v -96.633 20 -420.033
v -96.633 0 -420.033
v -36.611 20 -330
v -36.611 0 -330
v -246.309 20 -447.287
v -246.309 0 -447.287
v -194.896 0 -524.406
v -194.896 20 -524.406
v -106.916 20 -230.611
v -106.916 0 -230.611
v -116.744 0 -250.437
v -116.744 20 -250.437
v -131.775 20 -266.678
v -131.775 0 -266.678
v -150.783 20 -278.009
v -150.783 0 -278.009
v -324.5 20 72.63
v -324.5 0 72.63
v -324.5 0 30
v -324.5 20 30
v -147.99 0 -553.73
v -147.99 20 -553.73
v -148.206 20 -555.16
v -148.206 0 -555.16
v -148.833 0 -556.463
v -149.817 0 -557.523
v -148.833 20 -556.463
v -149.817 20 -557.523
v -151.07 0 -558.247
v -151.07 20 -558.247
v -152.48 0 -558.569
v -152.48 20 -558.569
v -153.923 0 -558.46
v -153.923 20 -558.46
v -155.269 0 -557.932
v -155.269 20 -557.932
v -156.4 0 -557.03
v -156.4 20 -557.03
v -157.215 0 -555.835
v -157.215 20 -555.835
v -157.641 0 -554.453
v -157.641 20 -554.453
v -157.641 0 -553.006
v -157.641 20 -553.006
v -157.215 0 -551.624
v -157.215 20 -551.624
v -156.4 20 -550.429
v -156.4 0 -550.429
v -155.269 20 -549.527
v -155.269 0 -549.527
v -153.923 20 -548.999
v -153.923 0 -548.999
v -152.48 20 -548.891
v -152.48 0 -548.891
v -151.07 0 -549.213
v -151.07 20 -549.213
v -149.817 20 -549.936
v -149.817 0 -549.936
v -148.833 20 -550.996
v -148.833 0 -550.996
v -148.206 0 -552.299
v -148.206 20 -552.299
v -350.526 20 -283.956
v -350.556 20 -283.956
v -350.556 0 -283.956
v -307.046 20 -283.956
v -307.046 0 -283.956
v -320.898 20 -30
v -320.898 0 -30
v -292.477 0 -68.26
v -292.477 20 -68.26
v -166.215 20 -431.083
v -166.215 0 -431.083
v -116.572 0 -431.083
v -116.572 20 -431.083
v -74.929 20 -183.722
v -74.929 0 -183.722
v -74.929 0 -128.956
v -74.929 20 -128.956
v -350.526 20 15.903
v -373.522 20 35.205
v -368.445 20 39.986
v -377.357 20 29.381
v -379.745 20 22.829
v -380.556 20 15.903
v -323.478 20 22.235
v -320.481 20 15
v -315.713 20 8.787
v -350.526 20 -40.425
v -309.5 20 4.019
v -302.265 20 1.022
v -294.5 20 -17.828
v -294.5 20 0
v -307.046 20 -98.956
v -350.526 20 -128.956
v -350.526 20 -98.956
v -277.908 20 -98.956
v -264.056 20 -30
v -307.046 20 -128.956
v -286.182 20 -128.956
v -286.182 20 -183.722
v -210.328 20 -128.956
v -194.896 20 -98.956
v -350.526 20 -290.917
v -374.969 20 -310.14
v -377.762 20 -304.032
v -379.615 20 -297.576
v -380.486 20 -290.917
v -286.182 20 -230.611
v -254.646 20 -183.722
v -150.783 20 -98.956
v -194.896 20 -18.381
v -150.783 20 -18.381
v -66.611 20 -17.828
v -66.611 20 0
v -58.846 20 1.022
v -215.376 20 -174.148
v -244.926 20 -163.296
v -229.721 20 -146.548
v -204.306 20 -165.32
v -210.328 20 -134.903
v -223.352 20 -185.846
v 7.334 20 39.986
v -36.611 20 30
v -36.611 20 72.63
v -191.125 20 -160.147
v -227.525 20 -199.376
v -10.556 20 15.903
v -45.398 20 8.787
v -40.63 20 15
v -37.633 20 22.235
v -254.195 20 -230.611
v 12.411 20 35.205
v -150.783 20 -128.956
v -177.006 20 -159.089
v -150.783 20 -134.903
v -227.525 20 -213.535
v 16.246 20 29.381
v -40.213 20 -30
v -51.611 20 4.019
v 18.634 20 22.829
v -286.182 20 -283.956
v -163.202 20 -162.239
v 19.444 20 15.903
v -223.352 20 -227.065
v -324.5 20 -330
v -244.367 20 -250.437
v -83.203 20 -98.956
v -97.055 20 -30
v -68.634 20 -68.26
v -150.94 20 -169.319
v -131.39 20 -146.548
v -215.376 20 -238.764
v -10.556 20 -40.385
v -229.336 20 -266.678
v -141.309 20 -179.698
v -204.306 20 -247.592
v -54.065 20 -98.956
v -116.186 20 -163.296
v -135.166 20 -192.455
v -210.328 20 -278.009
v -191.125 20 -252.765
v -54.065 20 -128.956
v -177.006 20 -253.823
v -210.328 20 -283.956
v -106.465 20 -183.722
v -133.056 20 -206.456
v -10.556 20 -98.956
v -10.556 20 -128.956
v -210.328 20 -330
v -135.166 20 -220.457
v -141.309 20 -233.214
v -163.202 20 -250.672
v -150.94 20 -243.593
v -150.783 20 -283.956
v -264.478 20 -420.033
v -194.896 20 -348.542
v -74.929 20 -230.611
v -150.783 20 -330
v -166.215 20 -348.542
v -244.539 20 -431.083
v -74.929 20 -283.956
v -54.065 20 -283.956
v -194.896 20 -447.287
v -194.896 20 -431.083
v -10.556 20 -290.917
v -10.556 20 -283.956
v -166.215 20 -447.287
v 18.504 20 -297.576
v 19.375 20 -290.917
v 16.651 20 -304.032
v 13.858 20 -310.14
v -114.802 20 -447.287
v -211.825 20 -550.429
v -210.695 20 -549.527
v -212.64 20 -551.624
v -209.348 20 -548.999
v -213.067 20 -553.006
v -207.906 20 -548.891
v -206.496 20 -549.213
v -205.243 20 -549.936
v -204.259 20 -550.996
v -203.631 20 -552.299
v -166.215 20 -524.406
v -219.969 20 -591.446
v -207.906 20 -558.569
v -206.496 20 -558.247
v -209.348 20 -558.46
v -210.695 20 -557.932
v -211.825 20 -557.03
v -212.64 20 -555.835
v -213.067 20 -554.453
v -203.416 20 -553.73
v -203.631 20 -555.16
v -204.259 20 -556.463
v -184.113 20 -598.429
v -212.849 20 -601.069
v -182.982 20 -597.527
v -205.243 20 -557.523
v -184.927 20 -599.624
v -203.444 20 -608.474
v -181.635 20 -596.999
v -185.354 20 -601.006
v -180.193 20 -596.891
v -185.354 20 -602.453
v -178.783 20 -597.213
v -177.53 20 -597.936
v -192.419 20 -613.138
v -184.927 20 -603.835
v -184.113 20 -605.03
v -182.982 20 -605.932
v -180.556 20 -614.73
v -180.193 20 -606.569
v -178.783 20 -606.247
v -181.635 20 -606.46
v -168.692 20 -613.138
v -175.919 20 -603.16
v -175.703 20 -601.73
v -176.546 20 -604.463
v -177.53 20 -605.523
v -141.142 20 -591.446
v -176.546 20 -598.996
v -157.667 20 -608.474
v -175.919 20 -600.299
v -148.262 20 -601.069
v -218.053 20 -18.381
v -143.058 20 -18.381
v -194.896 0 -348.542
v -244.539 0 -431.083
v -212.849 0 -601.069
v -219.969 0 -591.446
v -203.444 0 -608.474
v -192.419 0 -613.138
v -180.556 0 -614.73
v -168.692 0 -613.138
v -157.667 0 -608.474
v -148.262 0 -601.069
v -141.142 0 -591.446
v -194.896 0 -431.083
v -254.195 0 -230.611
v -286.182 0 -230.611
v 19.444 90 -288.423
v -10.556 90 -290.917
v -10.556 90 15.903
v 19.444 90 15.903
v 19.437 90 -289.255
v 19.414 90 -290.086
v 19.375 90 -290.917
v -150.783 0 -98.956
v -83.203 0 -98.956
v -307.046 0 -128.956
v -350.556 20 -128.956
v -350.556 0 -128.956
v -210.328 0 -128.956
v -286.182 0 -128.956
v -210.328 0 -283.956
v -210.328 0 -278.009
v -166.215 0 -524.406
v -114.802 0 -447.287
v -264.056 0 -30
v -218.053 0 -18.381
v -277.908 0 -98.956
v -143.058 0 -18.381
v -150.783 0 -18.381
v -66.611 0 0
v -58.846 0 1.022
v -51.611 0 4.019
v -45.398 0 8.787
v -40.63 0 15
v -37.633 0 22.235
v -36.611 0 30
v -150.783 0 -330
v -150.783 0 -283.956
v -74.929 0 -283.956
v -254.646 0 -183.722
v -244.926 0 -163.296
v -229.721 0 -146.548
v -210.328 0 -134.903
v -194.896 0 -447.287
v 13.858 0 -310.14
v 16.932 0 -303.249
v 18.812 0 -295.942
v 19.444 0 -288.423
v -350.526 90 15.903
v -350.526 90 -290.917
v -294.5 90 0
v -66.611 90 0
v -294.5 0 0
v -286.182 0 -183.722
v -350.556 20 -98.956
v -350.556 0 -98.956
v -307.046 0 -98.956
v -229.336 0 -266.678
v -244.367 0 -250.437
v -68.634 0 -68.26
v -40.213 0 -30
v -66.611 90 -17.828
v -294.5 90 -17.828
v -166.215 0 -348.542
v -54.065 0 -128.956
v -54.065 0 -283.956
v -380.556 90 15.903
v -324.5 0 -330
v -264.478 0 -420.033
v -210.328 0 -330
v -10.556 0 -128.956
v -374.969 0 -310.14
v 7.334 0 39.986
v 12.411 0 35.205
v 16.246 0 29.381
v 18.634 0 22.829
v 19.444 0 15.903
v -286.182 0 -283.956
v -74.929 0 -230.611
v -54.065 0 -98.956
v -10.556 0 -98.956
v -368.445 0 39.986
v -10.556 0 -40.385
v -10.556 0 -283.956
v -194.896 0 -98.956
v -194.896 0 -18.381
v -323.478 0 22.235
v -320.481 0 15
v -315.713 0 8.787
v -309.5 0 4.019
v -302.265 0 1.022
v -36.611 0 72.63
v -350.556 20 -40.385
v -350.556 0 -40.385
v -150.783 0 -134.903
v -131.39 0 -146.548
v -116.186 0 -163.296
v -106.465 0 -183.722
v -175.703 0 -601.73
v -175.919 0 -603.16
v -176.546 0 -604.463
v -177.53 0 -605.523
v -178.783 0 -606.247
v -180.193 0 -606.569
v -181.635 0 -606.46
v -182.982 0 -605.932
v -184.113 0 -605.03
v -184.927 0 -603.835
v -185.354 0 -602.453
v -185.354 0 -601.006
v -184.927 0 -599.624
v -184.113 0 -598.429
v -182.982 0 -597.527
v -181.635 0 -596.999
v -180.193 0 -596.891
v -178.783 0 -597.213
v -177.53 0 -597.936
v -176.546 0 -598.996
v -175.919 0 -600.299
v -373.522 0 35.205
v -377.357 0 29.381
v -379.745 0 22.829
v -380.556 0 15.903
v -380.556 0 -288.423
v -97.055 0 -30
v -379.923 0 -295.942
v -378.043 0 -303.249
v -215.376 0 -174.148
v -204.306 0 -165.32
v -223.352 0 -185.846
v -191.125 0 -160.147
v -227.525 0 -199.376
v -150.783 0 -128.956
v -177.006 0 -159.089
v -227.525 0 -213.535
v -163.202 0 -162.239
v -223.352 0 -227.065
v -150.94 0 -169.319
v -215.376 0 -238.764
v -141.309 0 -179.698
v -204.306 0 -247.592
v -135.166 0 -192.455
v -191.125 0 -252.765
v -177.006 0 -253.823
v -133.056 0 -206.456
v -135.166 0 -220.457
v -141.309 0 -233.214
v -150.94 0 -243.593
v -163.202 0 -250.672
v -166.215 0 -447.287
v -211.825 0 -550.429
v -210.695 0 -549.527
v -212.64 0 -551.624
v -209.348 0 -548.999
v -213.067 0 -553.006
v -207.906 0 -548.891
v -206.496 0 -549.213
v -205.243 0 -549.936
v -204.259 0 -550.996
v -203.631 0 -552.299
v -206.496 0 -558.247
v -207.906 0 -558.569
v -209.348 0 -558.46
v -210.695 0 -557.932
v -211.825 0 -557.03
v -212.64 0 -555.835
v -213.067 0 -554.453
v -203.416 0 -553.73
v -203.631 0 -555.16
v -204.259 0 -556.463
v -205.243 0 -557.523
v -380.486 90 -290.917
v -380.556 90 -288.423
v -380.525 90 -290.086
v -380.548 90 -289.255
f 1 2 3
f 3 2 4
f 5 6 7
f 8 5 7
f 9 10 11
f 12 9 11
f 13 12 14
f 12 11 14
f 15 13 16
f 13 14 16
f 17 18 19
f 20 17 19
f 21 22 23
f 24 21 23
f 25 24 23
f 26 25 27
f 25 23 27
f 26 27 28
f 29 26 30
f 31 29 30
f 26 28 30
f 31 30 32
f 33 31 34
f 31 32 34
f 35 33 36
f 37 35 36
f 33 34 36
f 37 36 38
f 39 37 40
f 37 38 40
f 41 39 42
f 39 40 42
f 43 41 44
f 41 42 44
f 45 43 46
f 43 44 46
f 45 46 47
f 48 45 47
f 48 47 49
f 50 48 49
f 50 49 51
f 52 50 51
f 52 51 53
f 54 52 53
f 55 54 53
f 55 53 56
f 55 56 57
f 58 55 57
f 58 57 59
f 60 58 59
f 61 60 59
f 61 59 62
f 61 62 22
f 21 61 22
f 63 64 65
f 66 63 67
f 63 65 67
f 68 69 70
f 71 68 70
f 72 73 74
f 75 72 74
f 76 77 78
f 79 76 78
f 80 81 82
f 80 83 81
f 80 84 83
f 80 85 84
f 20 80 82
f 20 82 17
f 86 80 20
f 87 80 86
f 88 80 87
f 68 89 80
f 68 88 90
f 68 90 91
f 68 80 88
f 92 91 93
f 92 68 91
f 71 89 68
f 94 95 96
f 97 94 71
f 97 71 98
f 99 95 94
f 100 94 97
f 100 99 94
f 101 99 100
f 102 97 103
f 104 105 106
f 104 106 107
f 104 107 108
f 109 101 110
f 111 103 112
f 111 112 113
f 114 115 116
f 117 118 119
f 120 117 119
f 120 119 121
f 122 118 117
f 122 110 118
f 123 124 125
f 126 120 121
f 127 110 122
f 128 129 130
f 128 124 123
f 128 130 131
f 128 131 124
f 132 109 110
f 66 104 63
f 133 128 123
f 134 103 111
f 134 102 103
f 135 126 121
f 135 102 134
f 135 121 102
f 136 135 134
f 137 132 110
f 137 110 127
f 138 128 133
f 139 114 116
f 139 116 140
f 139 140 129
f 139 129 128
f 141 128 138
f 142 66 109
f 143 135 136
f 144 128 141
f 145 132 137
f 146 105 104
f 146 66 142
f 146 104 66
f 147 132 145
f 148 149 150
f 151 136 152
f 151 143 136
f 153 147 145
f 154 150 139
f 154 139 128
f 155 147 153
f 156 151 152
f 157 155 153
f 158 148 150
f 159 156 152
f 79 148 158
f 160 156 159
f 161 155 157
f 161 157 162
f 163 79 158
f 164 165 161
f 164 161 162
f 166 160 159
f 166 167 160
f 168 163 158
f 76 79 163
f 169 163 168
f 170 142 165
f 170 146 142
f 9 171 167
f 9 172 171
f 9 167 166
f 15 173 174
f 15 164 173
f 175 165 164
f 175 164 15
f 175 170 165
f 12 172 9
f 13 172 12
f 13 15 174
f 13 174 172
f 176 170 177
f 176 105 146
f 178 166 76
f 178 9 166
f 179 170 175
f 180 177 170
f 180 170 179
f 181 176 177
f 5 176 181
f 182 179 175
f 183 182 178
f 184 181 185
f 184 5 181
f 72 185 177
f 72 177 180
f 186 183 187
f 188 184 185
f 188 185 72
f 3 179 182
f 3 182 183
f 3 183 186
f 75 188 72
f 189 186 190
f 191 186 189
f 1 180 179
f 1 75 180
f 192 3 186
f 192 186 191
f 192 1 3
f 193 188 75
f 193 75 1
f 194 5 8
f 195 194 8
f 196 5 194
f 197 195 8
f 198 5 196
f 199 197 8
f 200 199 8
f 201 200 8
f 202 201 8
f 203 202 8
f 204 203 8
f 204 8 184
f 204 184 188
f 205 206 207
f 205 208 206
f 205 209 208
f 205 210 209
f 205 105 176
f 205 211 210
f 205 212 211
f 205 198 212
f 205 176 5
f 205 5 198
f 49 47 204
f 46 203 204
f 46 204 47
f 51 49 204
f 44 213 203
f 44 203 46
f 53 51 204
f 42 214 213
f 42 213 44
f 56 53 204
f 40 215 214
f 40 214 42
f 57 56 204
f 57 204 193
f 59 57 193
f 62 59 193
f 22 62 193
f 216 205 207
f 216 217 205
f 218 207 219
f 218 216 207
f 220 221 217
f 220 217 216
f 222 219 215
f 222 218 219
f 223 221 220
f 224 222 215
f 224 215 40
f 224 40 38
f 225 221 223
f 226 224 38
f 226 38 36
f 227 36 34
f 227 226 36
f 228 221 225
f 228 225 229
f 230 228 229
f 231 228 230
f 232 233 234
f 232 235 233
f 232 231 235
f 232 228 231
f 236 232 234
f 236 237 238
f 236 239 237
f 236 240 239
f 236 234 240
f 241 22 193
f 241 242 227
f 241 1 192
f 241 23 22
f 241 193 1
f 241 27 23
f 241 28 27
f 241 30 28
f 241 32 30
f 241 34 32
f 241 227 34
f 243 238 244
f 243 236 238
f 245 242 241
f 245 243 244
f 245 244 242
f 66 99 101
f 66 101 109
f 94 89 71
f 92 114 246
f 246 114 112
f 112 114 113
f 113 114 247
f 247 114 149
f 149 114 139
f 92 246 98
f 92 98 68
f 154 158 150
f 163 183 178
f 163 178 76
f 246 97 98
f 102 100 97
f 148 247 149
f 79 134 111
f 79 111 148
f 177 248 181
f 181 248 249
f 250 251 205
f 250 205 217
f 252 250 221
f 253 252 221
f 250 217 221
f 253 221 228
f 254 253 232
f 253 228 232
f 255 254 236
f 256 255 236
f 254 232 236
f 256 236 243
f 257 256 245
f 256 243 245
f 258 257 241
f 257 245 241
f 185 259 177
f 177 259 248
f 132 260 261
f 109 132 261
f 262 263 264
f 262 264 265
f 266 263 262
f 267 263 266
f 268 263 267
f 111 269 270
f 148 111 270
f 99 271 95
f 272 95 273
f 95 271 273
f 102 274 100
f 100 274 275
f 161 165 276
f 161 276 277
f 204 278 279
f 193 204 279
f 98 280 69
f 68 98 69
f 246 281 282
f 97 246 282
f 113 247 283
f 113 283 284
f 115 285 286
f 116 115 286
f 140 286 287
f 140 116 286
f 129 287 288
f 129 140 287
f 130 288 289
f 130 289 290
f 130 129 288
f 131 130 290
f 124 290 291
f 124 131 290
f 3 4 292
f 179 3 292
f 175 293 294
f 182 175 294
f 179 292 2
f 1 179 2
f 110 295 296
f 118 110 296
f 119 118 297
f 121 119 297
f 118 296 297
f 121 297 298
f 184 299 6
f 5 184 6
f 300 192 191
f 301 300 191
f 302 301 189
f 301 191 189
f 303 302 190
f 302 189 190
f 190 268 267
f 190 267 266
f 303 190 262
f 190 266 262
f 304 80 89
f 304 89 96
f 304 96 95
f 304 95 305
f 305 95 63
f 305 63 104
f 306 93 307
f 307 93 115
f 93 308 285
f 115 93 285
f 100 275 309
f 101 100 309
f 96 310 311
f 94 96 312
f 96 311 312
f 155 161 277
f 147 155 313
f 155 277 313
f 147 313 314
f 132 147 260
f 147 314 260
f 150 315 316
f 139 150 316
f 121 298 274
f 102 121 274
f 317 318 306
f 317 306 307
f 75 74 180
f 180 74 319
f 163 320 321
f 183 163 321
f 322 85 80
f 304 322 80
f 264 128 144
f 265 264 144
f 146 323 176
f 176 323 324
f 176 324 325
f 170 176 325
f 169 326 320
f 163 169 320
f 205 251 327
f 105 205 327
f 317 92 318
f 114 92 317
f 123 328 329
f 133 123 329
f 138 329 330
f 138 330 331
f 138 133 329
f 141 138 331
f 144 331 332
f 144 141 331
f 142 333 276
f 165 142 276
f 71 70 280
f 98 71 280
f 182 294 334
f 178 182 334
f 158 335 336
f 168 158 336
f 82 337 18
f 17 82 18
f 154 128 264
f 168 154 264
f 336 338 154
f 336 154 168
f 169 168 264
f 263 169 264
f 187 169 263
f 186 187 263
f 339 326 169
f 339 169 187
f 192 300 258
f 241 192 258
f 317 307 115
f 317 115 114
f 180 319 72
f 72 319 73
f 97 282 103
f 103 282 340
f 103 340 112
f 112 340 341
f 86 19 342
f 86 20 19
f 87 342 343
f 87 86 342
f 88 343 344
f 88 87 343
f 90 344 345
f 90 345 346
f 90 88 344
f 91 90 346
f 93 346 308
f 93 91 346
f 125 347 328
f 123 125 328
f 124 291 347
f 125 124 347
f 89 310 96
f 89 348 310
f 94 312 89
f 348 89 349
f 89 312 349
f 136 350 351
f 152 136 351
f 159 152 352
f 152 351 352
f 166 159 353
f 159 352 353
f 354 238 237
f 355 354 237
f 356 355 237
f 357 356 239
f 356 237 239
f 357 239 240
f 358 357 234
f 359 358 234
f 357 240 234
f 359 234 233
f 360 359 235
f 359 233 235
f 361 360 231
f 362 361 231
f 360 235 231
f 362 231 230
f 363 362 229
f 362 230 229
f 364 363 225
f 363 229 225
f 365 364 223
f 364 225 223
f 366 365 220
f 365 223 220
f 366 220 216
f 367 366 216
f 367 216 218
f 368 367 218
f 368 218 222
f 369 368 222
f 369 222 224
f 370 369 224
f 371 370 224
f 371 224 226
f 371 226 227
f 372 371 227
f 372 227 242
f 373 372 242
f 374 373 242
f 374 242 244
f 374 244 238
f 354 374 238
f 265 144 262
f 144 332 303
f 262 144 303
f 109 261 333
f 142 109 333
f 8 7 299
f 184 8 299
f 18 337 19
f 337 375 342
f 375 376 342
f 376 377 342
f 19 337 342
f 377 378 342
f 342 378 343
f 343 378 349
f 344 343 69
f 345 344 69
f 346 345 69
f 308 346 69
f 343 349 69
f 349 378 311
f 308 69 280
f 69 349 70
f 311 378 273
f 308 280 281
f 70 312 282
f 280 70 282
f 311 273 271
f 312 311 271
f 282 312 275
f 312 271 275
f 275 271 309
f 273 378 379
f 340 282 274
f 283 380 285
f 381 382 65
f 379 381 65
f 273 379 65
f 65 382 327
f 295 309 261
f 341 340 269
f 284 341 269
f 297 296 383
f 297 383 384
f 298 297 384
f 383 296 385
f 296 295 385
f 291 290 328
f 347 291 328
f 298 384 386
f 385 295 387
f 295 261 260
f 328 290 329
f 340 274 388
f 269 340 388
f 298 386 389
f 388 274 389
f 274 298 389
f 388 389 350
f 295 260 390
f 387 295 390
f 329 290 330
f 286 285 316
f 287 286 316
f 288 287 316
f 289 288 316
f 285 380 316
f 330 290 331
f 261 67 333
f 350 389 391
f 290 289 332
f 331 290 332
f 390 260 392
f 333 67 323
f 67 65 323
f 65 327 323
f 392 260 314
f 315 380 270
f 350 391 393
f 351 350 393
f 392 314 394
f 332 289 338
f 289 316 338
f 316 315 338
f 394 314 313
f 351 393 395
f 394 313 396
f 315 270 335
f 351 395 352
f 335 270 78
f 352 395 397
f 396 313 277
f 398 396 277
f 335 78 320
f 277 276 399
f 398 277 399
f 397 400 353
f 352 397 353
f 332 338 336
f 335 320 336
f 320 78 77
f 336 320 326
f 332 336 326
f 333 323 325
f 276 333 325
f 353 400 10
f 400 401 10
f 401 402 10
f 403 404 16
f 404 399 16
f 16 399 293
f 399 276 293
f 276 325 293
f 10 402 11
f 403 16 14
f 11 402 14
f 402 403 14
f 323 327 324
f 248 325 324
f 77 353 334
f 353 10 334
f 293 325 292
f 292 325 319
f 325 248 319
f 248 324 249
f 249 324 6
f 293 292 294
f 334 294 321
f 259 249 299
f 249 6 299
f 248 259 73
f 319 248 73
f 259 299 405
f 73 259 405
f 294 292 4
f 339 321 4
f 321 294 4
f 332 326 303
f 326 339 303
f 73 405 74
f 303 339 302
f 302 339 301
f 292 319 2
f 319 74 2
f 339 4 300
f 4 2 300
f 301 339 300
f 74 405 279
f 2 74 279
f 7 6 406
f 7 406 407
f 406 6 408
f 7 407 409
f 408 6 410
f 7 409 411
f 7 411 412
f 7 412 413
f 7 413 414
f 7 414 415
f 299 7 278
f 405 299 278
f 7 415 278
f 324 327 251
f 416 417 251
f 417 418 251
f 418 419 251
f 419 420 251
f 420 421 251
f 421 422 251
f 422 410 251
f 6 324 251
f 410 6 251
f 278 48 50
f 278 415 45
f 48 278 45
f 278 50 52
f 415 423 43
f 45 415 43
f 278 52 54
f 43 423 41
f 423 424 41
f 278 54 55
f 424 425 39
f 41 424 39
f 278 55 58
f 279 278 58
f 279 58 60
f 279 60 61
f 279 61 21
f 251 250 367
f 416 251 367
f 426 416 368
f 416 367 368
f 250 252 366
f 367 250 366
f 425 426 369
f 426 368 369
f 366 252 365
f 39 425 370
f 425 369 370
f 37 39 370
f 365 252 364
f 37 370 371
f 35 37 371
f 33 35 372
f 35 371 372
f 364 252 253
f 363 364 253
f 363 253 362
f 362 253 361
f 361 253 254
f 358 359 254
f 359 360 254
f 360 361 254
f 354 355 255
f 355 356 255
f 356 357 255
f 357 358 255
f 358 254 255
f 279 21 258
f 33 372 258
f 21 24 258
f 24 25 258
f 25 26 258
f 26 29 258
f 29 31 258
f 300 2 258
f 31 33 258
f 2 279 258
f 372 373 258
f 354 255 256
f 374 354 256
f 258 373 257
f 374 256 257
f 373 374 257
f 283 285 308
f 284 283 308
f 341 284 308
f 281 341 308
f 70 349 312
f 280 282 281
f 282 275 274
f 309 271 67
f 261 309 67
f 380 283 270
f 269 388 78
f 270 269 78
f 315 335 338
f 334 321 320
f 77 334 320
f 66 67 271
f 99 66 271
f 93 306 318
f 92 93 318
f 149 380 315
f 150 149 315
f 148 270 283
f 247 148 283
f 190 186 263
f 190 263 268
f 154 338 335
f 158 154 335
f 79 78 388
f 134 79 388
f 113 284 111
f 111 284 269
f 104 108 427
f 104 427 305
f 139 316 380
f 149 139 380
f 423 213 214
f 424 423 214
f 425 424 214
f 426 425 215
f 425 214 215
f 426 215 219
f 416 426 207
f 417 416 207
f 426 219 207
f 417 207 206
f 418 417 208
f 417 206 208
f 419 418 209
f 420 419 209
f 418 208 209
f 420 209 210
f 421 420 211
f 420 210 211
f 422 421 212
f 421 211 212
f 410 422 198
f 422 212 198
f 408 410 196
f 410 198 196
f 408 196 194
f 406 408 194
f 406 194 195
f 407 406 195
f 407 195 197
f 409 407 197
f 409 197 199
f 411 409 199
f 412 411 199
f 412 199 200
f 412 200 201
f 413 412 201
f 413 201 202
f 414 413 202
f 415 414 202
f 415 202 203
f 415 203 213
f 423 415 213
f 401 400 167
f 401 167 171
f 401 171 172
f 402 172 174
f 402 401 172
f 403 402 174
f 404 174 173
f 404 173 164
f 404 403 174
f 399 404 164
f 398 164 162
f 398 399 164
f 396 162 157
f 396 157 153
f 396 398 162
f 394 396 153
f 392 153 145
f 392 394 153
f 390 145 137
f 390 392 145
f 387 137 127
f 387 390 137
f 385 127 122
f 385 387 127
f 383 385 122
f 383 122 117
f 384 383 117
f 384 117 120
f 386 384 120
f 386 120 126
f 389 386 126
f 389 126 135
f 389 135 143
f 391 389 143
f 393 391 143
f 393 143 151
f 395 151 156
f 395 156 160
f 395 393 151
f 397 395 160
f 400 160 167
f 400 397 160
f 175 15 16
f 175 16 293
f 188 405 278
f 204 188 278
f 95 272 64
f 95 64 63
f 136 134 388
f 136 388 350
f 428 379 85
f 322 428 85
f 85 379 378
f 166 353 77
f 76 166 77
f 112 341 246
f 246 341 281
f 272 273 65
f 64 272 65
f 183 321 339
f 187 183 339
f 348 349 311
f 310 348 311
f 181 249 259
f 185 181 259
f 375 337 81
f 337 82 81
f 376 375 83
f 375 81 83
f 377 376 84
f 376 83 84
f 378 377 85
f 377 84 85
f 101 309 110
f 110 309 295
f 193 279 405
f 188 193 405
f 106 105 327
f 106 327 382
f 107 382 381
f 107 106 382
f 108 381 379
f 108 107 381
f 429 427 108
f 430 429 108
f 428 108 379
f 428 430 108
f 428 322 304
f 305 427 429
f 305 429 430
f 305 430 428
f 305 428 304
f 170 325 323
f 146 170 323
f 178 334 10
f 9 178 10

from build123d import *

# Parameters (mm, degrees)
SKETCH1_R            = 47.5
BOSS_EXTRUDE6_DEPTH  = 20
FILLET2_R            = 30
SKETCH3_W            = 227.888974491
SKETCH3_H            = 17.82820952
SKETCH3_W_2          = 30.029703607
SKETCH3_H_2          = 306.819916415
SKETCH3_W_3          = 30
BOSS_EXTRUDE12_DEPTH = 70
FILLET3_R            = 45
FILLET4_R            = 45
SKETCH4_R            = 4.852465173
CUT_EXTRUDE2_DEPTH   = 21


with BuildPart() as part:
    # Sketch1 → Boss-Extrude6 (new body)
    with BuildSketch(Plane(origin=(0, 0, 0), x_dir=(1, 0, 0), z_dir=(0, 1, 0))):
        Polygon((-324.500042801, -72.630227613), (-324.500042801, 0), (-36.61106831, 0), (-36.61106831, -72.630227613), (19.444444444, -30.98937664), (19.444444444, 0), (19.444444444, 300), (-180.555555556, 662.976241067), (-380.555555556, 300), (-380.555555556, 0), (-380.555555556, -30.98937664), align=None)
        Polygon((-264.055692307, 30), (-320.898350202, 30), (-292.477021255, 68.259836918), align=None, mode=Mode.SUBTRACT)
        Polygon((-350.555555556, 40.384990781), (-350.555555556, 98.955926659), (-307.046121917, 98.955926659), align=None, mode=Mode.SUBTRACT)
        Polygon((-194.895952536, 18.381237109), (-218.052993309, 18.381237109), (-277.907920592, 98.955926659), (-194.895952536, 98.955926659), align=None, mode=Mode.SUBTRACT)
        Polygon((-307.046121917, 128.955926659), (-350.555555556, 128.955926659), (-350.555555556, 178.791030317), (-350.555555556, 221.457829656), (-350.555555556, 283.955926659), (-307.046121917, 283.955926659), (-307.046121917, 221.457829656), (-307.046121917, 178.791030317), align=None, mode=Mode.SUBTRACT)
        with BuildLine():
            Line((-210.32776095, 128.955926659), (-286.18247229, 128.955926659))
            Line((-286.18247229, 128.955926659), (-286.18247229, 183.722078004))
            Line((-286.18247229, 183.722078004), (-254.646190087, 183.722078004))
            ThreePointArc((-254.646190087, 183.722078004), (-237.937656941, 154.364234033), (-210.32776095, 134.902689235))
            Line((-210.32776095, 134.902689235), (-210.32776095, 128.955926659))
        make_face(mode=Mode.SUBTRACT)
        with BuildLine():
            Line((-286.18247229, 230.610640855), (-286.18247229, 283.955926659))
            Line((-286.18247229, 283.955926659), (-210.32776095, 283.955926659))
            Line((-210.32776095, 283.955926659), (-210.32776095, 278.009164084))
            ThreePointArc((-210.32776095, 278.009164084), (-237.43400989, 259.09708387), (-254.195217302, 230.610640855))
            Line((-254.195217302, 230.610640855), (-286.18247229, 230.610640855))
        make_face(mode=Mode.SUBTRACT)
        with Locations((-180.555555556, 206.455926659)):
            Circle(SKETCH1_R, mode=Mode.SUBTRACT)
        Polygon((-143.058117802, 18.381237109), (-150.783350161, 18.381237109), (-150.783350161, 98.955926659), (-83.203190519, 98.955926659), align=None, mode=Mode.SUBTRACT)
        Polygon((-68.634089856, 68.259836918), (-40.212760909, 30), (-97.055418804, 30), align=None, mode=Mode.SUBTRACT)
        Polygon((-10.555555556, 98.955926659), (-10.555555556, 40.384990781), (-54.064989194, 98.955926659), align=None, mode=Mode.SUBTRACT)
        with BuildLine():
            Line((-150.783350161, 128.955926659), (-150.783350161, 134.902689235))
            ThreePointArc((-150.783350161, 134.902689235), (-123.17345417, 154.364234033), (-106.464921024, 183.722078004))
            Line((-106.464921024, 183.722078004), (-74.928638821, 183.722078004))
            Line((-74.928638821, 183.722078004), (-74.928638821, 128.955926659))
            Line((-74.928638821, 128.955926659), (-150.783350161, 128.955926659))
        make_face(mode=Mode.SUBTRACT)
        with BuildLine():
            ThreePointArc((-106.915893809, 230.610640855), (-123.677101221, 259.09708387), (-150.783350161, 278.009164084))
            Line((-150.783350161, 278.009164084), (-150.783350161, 283.955926659))
            Line((-150.783350161, 283.955926659), (-74.928638821, 283.955926659))
            Line((-74.928638821, 283.955926659), (-74.928638821, 230.610640855))
            Line((-74.928638821, 230.610640855), (-106.915893809, 230.610640855))
        make_face(mode=Mode.SUBTRACT)
        Polygon((-10.555555556, 178.791030317), (-10.555555556, 128.955926659), (-54.064989194, 128.955926659), (-54.064989194, 178.791030317), (-54.064989194, 221.457829656), (-54.064989194, 283.955926659), (-10.555555556, 283.955926659), (-10.555555556, 221.457829656), align=None, mode=Mode.SUBTRACT)
        Polygon((-210.32776095, 330), (-324.500042801, 330), (-264.477795432, 420.033371054), align=None, mode=Mode.SUBTRACT)
        Polygon((-194.895952536, 348.542048906), (-244.539447118, 431.082553467), (-194.895952536, 431.082553467), align=None, mode=Mode.SUBTRACT)
        Polygon((-246.308768225, 447.286911864), (-194.895952536, 524.406135398), (-194.895952536, 447.286911864), align=None, mode=Mode.SUBTRACT)
        Polygon((-96.633315679, 420.033371054), (-36.61106831, 330), (-150.783350161, 330), align=None, mode=Mode.SUBTRACT)
        Polygon((-166.215158575, 431.082553467), (-116.571663993, 431.082553467), (-166.215158575, 348.542048906), align=None, mode=Mode.SUBTRACT)
        Polygon((-166.215158575, 524.406135398), (-114.802342886, 447.286911864), (-166.215158575, 447.286911864), align=None, mode=Mode.SUBTRACT)
    extrude(amount=BOSS_EXTRUDE6_DEPTH)

    # Fillet2
    fillet2_edges = [part.edges().sort_by_distance(p)[0] for p in [
        (19.444444444, 10, 30.98937664),
        (-36.61106831, 10, 0),
        (-324.500042801, 10, 0),
        (-380.555555556, 10, 30.98937664),
    ]]
    fillet(fillet2_edges, radius=FILLET2_R)

    # Sketch3 → Boss-Extrude12 (add)
    with BuildSketch(Plane(origin=(0, 20, 0), x_dir=(1, 0, 0), z_dir=(0, 1, 0))):
        with Locations((-180.555555556, 8.91410476)):
            Rectangle(SKETCH3_W, SKETCH3_H)
        with Locations((-365.540703753, 137.50677266)):
            Rectangle(SKETCH3_W_2, SKETCH3_H_2)
        with Locations((4.444444444, 137.50677266)):
            Rectangle(SKETCH3_W_3, SKETCH3_H_2)
    extrude(amount=BOSS_EXTRUDE12_DEPTH)

    # Fillet3
    fillet3_edges = [part.edges().sort_by_distance(p)[0] for p in [
        (-180.555555556, 10, -662.976241067),
    ]]
    fillet(fillet3_edges, radius=FILLET3_R)

    # Fillet4
    fillet4_edges = [part.edges().sort_by_distance(p)[0] for p in [
        (-380.555555556, 10, -300),
        (19.444444444, 10, -300),
    ]]
    fillet(fillet4_edges, radius=FILLET4_R)

    # Sketch4 → Cut-Extrude2 (cut, through all)
    with BuildSketch(Plane(origin=(0, 20, 0), x_dir=(1, 0, 0), z_dir=(0, 1, 0))):
        with Locations((-180.555555556, 601.729619553)):
            Circle(SKETCH4_R)
        with Locations((-208.268368477, 553.729619553)):
            Circle(SKETCH4_R)
        with Locations((-152.842742634, 553.729619553)):
            Circle(SKETCH4_R)
    extrude(amount=-CUT_EXTRUDE2_DEPTH, mode=Mode.SUBTRACT)


solid = part.part
